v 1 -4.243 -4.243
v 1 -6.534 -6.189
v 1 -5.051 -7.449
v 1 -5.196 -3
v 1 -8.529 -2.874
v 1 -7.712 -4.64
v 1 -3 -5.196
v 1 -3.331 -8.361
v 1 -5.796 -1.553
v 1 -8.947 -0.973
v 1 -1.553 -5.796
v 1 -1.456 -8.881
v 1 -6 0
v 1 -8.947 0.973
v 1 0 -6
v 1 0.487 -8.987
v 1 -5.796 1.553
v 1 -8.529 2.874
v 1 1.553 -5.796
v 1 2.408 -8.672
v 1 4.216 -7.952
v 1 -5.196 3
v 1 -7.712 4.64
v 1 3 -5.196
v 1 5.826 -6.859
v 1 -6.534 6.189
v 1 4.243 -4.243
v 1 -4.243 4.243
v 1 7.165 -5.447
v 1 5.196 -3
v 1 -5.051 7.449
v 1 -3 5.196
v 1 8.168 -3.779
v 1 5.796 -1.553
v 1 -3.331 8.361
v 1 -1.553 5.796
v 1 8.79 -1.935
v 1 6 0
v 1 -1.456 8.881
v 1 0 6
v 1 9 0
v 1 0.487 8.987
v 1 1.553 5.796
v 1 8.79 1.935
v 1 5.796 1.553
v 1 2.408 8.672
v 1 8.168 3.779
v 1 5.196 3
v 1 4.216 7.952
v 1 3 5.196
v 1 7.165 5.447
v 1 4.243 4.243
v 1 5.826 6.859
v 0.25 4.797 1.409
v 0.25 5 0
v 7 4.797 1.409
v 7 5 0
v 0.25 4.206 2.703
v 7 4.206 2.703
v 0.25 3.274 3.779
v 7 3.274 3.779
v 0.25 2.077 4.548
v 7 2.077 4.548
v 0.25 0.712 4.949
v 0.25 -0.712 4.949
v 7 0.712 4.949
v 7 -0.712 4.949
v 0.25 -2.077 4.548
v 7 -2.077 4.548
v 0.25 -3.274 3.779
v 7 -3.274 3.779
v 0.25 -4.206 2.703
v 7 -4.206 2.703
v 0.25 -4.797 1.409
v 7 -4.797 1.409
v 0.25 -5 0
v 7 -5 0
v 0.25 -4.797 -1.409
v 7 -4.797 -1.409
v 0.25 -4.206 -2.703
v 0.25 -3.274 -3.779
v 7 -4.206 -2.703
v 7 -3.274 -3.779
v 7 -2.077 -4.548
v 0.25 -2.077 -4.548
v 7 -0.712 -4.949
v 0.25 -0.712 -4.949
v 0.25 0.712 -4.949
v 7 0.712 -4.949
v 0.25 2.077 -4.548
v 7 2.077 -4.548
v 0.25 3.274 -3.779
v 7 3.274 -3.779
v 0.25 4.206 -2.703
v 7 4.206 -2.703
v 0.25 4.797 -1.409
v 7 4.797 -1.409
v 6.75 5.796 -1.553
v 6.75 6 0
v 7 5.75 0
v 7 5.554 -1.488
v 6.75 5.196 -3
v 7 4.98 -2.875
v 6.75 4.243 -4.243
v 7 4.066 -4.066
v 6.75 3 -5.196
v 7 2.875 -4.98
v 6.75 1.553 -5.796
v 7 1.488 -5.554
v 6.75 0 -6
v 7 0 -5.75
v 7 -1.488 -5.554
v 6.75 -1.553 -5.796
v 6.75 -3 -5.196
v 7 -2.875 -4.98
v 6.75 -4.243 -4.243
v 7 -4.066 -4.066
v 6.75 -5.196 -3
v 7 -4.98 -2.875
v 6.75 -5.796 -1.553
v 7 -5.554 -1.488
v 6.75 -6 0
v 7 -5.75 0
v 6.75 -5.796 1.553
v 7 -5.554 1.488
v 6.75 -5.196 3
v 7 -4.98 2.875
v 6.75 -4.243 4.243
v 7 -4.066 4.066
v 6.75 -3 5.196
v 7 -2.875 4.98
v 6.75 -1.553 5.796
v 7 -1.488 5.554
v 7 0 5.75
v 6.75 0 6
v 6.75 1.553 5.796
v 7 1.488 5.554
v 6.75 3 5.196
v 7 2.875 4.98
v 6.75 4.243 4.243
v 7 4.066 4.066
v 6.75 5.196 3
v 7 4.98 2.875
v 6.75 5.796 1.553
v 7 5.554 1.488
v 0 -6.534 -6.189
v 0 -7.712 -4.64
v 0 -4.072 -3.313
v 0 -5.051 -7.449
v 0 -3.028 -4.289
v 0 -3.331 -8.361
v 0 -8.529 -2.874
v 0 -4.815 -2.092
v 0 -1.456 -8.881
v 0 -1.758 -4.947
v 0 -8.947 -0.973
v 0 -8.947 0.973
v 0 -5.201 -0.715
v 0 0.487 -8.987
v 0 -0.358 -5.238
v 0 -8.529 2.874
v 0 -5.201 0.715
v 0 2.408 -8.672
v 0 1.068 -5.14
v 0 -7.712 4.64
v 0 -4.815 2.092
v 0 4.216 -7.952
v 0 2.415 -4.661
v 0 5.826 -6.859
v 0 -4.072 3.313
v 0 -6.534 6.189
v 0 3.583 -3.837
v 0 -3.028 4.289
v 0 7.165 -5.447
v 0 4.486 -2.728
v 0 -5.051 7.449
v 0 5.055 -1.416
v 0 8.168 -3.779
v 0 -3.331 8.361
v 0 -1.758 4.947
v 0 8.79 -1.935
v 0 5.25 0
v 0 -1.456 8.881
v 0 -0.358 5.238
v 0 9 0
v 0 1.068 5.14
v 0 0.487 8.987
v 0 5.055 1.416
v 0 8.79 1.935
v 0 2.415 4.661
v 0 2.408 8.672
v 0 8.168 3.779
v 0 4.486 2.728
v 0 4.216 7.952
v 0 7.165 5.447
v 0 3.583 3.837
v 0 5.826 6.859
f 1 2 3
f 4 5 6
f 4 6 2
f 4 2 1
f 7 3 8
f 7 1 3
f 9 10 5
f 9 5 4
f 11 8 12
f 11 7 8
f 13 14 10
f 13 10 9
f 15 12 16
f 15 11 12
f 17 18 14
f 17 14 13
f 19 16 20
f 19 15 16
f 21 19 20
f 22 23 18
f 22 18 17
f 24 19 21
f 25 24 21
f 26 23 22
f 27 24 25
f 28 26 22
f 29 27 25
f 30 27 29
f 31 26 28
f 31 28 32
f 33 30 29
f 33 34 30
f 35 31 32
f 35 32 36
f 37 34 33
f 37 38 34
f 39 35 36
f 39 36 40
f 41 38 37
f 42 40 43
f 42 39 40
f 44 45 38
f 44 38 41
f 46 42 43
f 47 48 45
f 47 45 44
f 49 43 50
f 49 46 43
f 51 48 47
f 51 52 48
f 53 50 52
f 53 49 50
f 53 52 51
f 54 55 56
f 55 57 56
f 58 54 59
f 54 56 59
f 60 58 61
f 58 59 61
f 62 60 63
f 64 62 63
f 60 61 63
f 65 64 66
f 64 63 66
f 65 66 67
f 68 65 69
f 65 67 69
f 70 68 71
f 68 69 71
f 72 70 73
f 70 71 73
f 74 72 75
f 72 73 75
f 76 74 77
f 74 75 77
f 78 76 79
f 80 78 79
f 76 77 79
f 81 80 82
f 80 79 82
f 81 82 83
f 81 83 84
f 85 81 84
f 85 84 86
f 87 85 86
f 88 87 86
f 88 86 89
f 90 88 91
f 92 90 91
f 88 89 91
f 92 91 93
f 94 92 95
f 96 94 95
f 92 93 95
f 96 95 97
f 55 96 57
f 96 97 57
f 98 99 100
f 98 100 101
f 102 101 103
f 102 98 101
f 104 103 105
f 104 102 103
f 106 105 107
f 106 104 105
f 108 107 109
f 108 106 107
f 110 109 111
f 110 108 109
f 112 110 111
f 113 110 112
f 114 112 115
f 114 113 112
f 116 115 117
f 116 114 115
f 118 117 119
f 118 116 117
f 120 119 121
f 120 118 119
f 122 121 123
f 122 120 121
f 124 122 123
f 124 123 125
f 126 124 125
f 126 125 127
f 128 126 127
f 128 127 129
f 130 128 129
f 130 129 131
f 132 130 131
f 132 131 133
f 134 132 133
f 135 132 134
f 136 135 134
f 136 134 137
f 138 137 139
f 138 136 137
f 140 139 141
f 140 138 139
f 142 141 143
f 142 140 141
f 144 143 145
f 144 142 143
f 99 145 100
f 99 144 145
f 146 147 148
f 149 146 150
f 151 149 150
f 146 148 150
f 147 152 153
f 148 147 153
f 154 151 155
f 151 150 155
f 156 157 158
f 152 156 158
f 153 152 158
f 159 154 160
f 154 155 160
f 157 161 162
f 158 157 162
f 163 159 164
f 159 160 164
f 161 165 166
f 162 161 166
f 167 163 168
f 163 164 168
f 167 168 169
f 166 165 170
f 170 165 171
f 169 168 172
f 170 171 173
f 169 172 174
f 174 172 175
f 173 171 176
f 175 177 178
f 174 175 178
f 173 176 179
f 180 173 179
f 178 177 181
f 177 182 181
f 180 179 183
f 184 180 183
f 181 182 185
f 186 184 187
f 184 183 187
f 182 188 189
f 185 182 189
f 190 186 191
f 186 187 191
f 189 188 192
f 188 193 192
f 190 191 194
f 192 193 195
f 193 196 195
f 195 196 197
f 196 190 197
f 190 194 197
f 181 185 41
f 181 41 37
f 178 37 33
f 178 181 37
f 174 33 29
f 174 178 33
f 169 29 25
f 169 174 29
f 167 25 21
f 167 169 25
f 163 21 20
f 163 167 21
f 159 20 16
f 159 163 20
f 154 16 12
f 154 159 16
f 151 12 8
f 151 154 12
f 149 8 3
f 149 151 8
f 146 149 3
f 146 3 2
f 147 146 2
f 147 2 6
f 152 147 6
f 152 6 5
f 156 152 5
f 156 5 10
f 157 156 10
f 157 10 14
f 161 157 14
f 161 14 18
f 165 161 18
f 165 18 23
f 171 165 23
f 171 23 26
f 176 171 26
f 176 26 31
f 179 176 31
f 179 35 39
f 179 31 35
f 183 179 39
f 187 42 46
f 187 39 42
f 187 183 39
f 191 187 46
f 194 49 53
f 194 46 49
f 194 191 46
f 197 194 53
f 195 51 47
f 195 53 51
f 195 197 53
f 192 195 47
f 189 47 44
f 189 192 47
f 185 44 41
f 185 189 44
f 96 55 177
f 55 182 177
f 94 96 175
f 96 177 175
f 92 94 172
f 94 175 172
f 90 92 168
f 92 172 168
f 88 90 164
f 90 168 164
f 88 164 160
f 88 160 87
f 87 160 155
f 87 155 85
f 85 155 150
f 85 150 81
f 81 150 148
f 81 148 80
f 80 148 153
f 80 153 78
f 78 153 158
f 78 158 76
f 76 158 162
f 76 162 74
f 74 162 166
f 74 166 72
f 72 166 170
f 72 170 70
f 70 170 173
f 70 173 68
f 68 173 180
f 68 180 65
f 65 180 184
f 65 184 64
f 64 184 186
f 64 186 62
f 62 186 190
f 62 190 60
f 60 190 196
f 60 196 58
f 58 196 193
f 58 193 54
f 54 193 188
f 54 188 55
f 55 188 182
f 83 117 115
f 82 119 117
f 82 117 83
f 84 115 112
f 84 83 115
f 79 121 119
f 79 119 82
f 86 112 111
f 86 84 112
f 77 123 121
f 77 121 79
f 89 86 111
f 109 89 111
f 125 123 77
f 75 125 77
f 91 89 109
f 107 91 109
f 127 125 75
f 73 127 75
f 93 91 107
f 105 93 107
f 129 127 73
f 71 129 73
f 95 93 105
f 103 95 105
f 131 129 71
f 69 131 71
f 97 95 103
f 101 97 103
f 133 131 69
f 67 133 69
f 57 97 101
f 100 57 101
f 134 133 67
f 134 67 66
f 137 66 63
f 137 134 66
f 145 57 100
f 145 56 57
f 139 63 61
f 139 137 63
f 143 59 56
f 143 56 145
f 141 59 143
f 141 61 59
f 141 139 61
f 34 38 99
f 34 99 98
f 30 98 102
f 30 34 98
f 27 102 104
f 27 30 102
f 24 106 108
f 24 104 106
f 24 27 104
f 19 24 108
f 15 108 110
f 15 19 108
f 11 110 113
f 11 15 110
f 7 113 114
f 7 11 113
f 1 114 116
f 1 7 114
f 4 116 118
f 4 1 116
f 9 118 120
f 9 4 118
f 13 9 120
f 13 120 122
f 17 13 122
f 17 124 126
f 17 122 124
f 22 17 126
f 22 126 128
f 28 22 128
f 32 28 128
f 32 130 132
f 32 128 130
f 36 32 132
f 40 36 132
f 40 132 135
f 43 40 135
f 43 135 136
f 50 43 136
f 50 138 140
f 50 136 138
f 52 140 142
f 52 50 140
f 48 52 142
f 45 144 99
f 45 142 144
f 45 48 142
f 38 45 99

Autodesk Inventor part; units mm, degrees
ref_plane "YZ Plane" through (0, 0, 0) normal (1, 0, 0) x (0, 1, 0)
ref_plane "XZ Plane" through (0, 0, 0) normal (0, 1, 0) x (-1, 0, 0)
ref_plane "XY Plane" through (0, 0, 0) normal (0, 0, 1) x (1, 0, 0)
sketch "Sketch_1" plane through (0, 0, 0) normal (0, 0, 1) x (1, 0, 0)
  line L0 (7, 0) -> (0, 0)
  line L1 (0, 9) -> (0, 5.25)
  line L2 (0, 5.25) -> (0.25, 5)
  line L3 (0.25, 5) -> (7, 5)
  line L4 (7, 5) -> (7, 5.75)
  line L5 (7, 5.75) -> (6.75, 6)
  line L6 (6.75, 6) -> (1, 6)
  line L7 (1, 6) -> (1, 9)
  line L8 (1, 9) -> (0, 9)
revolve "Revolution1" add sketch "Sketch_1" angle 360 about axis through (7, 0, 0) along (1, 0, 0)
properties part number "SKF_PPMF 101207"
